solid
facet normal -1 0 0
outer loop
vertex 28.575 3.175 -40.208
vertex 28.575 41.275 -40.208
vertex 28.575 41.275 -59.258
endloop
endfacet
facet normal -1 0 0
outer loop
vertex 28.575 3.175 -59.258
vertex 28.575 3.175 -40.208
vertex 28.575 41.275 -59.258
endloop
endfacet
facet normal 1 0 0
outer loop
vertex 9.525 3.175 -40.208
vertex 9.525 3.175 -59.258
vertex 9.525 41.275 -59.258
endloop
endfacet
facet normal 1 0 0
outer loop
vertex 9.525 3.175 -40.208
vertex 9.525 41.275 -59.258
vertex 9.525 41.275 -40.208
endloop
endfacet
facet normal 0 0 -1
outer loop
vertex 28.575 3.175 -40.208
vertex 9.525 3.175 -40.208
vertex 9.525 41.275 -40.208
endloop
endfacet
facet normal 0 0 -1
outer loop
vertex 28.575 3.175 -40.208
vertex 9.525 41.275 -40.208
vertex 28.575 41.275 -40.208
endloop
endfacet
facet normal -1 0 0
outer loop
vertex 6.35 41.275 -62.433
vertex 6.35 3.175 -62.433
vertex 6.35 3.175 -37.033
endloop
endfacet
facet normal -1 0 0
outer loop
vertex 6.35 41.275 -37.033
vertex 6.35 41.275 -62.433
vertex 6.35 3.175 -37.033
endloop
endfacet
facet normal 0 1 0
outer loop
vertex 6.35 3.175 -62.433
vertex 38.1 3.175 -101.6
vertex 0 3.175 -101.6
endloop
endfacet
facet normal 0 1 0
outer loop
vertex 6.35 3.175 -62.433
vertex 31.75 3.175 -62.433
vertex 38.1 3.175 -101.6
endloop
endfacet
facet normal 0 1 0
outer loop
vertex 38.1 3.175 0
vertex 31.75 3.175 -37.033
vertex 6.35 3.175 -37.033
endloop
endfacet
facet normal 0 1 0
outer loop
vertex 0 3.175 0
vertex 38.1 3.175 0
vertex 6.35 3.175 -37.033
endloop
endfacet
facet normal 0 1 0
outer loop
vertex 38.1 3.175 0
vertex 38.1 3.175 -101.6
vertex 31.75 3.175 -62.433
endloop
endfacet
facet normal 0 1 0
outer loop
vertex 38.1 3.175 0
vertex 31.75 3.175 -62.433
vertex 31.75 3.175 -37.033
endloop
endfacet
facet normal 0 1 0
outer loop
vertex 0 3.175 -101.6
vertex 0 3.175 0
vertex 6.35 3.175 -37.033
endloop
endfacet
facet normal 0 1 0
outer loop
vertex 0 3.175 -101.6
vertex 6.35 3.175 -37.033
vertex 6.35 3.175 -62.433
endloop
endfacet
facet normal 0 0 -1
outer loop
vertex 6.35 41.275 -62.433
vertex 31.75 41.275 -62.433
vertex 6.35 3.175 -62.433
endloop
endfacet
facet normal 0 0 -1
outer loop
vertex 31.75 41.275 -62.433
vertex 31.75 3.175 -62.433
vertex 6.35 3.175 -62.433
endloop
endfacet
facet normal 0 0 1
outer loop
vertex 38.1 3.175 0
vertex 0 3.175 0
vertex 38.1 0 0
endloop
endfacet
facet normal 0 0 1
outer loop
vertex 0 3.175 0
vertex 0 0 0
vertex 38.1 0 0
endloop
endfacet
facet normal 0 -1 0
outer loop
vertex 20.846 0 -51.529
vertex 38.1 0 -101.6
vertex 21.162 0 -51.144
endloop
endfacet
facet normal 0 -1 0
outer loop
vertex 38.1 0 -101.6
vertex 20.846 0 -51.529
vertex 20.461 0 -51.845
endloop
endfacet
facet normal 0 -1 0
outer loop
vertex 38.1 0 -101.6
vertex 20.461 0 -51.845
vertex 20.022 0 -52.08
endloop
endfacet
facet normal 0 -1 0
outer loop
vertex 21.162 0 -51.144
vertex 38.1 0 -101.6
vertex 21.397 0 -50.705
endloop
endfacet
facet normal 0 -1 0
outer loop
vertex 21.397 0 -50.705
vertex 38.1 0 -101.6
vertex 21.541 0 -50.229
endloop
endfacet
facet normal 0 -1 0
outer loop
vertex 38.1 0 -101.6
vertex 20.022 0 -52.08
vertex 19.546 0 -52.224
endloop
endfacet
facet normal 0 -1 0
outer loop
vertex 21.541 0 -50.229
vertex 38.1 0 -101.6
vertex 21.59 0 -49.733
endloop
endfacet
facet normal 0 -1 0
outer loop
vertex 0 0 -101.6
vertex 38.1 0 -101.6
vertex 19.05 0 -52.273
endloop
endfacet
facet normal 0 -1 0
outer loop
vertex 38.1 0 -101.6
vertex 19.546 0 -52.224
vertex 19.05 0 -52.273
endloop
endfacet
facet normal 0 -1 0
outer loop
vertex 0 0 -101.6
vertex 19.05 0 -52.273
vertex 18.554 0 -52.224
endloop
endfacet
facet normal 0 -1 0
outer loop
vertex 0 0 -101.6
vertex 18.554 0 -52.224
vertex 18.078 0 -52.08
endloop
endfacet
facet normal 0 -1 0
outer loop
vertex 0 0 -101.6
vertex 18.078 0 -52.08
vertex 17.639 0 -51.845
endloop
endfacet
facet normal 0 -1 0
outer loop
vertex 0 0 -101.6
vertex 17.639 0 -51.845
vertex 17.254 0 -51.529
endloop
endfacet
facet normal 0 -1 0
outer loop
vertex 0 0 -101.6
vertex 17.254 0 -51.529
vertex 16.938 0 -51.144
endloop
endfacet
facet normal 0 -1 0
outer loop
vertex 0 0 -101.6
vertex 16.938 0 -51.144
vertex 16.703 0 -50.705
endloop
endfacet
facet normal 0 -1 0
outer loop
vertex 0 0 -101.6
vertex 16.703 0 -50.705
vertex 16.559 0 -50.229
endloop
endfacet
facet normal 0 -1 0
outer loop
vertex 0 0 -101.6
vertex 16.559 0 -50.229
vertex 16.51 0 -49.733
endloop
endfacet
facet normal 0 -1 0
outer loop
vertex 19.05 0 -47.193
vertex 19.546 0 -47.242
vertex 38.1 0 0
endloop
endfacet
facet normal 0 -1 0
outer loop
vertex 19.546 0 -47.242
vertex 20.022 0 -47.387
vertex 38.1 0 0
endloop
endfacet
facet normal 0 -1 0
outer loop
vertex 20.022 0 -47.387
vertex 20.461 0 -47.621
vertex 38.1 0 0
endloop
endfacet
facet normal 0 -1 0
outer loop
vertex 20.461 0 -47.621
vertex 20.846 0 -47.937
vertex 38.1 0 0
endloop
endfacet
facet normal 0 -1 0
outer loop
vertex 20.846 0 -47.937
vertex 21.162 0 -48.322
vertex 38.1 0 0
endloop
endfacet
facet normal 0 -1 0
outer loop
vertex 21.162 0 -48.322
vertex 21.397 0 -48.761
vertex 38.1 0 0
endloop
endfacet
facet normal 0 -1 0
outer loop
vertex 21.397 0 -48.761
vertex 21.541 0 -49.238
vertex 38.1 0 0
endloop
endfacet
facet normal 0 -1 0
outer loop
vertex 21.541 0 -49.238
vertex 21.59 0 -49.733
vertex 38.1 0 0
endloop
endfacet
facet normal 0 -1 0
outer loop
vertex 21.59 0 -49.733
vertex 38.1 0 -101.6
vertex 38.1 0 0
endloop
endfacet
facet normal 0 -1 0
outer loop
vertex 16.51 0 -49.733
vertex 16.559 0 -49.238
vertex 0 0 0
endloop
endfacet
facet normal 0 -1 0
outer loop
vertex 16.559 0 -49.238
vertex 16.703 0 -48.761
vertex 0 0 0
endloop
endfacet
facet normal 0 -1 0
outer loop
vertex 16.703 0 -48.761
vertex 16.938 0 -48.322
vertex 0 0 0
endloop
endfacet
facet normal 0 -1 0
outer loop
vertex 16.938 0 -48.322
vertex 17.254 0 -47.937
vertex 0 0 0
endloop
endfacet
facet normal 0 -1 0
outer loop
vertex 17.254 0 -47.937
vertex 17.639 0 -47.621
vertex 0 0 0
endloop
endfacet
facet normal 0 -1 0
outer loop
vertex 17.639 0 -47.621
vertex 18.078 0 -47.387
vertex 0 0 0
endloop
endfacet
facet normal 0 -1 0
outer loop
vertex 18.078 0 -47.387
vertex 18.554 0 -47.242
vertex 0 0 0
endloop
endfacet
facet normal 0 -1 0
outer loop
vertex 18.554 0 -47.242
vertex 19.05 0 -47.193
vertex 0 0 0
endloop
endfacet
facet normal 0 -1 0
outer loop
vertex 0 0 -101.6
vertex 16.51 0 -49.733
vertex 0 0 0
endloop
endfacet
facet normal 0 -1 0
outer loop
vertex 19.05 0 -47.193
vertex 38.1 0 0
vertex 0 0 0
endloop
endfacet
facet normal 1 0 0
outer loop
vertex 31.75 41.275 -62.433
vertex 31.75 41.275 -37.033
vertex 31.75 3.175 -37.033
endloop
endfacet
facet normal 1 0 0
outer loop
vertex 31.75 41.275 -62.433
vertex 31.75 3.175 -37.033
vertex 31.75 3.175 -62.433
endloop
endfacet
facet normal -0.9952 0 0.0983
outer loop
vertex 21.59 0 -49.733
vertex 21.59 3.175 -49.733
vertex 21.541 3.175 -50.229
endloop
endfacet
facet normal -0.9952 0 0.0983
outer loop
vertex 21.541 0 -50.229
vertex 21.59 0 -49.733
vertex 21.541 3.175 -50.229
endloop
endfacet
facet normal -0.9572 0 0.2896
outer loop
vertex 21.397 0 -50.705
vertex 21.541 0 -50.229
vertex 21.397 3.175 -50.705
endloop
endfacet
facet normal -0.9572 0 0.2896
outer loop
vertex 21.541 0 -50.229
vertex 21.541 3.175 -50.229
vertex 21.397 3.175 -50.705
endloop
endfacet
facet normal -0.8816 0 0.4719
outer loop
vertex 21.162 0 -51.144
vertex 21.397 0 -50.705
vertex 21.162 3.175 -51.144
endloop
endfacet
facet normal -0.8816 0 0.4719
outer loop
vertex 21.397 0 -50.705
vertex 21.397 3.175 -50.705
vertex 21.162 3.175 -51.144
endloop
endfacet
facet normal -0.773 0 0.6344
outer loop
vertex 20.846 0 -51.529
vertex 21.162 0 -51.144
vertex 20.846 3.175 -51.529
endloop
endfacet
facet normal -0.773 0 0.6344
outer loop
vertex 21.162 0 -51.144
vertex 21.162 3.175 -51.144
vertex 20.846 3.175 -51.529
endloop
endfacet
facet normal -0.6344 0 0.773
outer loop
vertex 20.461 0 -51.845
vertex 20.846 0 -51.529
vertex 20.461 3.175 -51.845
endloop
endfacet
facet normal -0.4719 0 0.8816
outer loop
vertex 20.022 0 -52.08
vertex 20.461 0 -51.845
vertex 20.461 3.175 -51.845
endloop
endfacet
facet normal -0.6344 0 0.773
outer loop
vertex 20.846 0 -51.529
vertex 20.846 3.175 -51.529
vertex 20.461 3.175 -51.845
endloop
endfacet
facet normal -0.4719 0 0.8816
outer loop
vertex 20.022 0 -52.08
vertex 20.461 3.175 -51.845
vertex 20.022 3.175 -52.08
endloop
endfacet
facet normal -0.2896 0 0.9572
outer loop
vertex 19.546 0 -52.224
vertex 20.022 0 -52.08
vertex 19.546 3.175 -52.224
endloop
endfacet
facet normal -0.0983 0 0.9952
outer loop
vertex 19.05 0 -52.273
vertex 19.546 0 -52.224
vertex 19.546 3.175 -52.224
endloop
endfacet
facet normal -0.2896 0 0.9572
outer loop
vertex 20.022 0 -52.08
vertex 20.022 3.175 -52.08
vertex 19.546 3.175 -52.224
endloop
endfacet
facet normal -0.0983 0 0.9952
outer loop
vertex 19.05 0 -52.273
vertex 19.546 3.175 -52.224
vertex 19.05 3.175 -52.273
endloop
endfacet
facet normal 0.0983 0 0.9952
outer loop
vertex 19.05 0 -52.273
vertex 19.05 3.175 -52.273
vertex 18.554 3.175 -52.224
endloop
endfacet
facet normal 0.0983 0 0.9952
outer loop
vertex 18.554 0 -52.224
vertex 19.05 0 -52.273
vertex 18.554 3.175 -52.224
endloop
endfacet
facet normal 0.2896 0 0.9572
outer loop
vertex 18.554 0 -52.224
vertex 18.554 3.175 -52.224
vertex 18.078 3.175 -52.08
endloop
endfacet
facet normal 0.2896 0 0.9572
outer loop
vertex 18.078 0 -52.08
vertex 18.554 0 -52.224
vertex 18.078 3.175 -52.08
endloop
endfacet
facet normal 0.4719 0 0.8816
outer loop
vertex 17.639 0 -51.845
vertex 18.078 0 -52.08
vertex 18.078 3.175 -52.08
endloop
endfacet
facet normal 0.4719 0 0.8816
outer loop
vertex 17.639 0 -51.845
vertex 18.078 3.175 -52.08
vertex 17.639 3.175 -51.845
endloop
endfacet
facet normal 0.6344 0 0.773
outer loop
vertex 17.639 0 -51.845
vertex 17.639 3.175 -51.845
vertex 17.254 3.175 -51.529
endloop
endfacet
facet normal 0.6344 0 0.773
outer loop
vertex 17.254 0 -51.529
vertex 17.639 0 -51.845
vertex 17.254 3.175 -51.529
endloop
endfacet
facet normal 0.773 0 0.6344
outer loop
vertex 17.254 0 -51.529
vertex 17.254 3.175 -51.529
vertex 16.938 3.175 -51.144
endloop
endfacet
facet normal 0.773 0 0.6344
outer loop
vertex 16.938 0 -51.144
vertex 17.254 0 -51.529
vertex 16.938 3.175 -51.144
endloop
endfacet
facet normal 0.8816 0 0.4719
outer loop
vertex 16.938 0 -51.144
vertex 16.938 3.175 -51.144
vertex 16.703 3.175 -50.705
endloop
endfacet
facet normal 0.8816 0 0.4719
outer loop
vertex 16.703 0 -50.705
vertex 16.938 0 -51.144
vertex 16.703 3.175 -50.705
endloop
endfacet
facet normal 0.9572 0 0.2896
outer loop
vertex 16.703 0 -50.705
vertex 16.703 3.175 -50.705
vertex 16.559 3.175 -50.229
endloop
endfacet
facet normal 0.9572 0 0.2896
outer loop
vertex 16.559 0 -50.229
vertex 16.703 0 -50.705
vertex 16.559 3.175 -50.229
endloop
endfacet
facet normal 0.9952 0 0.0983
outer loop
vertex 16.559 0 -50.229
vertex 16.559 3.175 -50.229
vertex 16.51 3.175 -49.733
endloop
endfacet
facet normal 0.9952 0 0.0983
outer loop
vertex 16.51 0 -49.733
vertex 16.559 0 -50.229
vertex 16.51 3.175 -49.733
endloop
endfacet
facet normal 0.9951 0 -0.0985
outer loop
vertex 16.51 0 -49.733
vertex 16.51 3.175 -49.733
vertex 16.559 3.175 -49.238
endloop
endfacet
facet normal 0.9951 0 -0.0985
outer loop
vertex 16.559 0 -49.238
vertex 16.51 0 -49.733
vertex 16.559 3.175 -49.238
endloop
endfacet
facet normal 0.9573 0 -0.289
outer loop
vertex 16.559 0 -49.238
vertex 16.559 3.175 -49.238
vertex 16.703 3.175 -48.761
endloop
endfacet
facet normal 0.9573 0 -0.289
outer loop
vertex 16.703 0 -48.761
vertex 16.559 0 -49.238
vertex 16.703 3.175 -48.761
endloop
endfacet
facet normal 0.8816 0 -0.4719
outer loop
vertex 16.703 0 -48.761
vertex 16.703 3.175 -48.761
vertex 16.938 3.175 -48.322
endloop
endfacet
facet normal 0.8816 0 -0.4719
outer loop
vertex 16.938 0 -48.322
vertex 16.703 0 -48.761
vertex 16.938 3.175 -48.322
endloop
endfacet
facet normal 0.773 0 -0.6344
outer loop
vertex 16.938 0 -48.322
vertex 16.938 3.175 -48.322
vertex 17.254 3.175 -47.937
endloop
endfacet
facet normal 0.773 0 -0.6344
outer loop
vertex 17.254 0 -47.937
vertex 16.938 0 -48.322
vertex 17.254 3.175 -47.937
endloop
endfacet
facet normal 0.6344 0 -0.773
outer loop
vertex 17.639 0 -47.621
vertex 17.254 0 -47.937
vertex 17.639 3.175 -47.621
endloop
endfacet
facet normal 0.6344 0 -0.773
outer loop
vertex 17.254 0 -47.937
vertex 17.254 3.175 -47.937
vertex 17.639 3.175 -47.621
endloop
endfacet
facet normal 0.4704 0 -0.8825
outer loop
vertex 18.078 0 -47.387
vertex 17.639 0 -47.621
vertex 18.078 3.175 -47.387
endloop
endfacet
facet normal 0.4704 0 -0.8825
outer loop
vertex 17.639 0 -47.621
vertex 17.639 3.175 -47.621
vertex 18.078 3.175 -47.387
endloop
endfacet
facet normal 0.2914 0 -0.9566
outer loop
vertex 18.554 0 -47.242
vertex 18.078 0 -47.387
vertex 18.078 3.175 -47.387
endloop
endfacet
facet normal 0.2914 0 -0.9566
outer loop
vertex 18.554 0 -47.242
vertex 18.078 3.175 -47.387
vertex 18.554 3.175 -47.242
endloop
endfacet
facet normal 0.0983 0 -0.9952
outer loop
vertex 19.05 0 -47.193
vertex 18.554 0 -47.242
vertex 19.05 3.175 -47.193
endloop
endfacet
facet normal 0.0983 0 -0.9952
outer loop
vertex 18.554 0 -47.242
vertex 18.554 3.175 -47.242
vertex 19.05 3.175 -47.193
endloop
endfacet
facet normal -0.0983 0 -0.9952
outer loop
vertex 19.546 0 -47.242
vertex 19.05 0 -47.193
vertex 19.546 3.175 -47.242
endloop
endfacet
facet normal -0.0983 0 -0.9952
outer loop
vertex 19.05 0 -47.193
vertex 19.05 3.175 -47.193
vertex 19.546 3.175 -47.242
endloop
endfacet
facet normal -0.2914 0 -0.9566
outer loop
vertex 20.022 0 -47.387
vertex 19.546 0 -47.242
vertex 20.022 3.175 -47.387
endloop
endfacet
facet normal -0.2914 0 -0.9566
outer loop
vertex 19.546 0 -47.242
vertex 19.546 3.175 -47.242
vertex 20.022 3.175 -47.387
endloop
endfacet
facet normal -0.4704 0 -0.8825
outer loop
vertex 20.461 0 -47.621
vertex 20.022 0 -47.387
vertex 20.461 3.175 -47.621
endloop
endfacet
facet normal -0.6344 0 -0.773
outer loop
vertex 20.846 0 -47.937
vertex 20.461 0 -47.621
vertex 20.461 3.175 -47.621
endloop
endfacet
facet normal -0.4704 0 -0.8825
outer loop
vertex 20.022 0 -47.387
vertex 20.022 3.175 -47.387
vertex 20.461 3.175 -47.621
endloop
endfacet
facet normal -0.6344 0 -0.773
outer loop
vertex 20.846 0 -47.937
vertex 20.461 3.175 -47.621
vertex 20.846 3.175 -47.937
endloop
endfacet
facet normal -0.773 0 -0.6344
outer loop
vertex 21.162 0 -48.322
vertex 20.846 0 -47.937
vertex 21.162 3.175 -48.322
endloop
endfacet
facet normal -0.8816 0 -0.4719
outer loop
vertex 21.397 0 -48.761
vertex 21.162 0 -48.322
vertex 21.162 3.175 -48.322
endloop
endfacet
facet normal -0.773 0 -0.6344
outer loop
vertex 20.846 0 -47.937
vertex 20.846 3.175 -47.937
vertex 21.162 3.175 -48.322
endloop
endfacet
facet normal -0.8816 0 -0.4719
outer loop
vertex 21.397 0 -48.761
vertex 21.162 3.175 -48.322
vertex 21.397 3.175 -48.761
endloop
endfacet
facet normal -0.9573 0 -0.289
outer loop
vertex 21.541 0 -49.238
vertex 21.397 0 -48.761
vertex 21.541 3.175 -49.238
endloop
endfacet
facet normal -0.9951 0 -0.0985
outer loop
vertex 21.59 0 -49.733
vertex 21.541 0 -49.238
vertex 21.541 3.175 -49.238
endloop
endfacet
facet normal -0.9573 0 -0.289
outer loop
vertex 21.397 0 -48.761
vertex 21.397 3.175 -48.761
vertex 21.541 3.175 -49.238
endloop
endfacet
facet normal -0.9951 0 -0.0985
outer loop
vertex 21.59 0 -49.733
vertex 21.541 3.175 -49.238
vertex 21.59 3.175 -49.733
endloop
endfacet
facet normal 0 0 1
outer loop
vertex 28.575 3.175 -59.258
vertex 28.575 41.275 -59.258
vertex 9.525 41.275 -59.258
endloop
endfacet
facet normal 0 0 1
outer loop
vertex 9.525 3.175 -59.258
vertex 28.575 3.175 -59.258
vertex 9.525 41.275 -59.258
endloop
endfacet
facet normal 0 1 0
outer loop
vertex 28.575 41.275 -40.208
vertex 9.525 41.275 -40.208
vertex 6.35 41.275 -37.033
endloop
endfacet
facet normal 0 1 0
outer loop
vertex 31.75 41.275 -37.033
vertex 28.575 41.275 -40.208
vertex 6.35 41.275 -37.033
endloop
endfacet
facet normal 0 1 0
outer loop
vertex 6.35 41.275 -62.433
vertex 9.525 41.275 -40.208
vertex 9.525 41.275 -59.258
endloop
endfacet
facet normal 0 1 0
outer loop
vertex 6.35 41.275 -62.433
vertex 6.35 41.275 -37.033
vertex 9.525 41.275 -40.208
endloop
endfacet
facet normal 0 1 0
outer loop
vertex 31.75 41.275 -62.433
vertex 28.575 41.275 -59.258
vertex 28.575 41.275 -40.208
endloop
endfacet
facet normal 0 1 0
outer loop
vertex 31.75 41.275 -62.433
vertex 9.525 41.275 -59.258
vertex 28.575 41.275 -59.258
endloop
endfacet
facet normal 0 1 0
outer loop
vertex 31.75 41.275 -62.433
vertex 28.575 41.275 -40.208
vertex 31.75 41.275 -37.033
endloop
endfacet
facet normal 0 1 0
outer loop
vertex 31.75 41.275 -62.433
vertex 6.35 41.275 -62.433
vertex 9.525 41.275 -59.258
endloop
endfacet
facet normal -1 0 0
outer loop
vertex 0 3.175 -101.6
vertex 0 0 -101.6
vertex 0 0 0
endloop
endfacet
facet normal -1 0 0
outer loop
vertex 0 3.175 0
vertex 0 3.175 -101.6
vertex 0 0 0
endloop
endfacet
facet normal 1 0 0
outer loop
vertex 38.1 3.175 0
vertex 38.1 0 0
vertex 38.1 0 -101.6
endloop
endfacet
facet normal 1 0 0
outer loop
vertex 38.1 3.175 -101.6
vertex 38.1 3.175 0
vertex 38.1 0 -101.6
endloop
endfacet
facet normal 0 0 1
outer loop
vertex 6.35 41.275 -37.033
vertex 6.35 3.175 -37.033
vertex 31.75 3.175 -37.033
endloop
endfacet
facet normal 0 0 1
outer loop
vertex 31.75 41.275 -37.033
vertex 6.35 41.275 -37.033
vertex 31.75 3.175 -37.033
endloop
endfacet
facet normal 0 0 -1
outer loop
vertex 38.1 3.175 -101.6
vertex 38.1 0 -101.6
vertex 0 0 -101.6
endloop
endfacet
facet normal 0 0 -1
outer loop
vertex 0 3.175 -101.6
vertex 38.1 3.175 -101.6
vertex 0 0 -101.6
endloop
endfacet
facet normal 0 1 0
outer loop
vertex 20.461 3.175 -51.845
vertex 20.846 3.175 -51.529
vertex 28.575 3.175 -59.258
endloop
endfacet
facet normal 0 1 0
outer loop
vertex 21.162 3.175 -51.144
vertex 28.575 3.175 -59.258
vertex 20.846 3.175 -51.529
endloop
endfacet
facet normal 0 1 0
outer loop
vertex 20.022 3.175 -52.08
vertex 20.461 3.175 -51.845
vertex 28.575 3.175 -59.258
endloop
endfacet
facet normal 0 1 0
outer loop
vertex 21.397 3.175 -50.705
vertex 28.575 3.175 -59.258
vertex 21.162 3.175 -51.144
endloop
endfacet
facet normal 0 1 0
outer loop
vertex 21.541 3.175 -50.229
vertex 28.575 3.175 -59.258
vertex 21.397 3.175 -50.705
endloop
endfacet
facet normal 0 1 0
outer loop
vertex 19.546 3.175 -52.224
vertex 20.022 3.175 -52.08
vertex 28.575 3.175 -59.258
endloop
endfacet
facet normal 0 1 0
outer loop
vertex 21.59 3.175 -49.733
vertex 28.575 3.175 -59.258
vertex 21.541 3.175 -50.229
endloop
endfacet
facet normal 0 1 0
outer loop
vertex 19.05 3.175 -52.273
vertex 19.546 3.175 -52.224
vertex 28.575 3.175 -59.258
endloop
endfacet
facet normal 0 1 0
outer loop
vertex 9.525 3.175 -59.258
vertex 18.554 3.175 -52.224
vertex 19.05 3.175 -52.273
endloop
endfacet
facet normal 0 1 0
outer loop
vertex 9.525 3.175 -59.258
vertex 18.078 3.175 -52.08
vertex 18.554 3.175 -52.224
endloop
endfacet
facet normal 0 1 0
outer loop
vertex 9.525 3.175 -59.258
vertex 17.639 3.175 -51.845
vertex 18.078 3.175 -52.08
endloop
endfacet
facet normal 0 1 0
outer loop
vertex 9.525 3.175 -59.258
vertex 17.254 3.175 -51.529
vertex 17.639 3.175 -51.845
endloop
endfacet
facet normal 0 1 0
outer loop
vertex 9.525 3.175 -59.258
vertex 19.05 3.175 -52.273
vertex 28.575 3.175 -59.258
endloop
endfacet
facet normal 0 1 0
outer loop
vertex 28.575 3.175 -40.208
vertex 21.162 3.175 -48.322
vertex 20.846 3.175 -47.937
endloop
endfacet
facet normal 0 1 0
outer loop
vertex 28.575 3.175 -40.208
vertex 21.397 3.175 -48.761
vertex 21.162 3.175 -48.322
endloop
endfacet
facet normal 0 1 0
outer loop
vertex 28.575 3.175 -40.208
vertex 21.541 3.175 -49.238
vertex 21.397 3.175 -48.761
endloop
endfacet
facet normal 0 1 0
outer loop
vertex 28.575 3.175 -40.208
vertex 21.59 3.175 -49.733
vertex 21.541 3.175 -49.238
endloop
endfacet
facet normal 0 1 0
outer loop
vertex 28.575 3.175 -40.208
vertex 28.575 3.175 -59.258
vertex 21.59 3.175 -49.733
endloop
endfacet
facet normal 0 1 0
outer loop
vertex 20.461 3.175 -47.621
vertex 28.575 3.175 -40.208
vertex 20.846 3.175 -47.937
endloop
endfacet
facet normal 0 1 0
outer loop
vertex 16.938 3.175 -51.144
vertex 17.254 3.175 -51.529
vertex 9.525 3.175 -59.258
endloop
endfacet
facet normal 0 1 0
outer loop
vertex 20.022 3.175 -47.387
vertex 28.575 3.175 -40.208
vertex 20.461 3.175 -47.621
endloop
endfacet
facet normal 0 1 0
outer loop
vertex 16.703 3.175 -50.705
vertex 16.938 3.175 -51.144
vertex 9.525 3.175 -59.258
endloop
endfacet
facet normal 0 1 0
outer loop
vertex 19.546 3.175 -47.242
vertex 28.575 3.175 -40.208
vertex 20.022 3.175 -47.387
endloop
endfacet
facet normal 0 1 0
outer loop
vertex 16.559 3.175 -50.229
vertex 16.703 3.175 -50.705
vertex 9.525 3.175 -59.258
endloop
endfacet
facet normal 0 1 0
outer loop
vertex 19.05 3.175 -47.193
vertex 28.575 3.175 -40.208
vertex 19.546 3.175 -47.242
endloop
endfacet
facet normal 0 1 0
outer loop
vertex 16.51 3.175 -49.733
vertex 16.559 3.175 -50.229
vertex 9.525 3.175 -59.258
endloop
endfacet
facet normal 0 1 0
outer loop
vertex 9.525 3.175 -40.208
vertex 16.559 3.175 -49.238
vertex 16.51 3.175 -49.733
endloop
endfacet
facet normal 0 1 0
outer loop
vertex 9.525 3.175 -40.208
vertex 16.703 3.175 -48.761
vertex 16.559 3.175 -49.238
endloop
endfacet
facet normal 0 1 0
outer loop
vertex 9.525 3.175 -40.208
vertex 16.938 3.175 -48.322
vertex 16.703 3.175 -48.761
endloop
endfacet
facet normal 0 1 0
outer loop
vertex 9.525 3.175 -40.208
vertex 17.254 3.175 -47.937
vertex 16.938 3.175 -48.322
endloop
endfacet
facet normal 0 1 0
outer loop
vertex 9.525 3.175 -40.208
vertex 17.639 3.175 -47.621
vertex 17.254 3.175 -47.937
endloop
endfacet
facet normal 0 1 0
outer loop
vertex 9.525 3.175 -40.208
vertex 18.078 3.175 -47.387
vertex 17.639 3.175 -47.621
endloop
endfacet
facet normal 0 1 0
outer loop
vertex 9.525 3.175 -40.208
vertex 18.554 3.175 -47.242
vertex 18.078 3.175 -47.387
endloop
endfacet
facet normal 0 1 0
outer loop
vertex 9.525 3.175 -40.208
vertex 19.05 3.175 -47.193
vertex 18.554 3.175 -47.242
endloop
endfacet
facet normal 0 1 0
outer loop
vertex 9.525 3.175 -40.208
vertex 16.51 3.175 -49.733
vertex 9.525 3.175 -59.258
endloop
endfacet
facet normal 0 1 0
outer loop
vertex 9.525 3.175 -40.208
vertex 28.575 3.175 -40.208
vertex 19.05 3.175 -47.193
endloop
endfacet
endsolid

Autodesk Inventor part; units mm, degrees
ref_plane "YZ Plane" through (0, 0, 0) normal (1, 0, 0) x (0, 1, 0)
ref_plane "XZ Plane" through (0, 0, 0) normal (0, 1, 0) x (-1, 0, 0)
ref_plane "XY Plane" through (0, 0, 0) normal (0, 0, 1) x (1, 0, 0)
sketch "Sketch1" plane through (0, 0, 0) normal (0, 1, 0) x (-1, 0, 0)
  line L0 (0, 0) -> (-38.1, 0)
  line L1 (-38.1, 0) -> (-38.1, -101.6)
  line L2 (-38.1, -101.6) -> (0, -101.6)
  line L3 (0, -101.6) -> (0, 0)
  dimension "d0" = 38.1
  dimension "d1" = 101.6
extrude "Extrusion1" add sketch "Sketch1" along normal blind 3.175
sketch "Sketch3" plane through (0, 3.175, 0) normal (0, 1, 0) x (1, 0, 0)
  line L0 (31.75, 62.4332) -> (6.35, 62.4332)
  line L1 (6.35, 62.4332) -> (6.35, 37.0332)
  line L2 (6.35, 37.0332) -> (31.75, 37.0332)
  line L3 (31.75, 37.0332) -> (31.75, 62.4332)
  line L4 (38.1, 0) -> (38.1, 101.6) projected
  line L5 (38.1, 101.6) -> (0, 101.6) projected
  line L6 (28.575, 59.2582) -> (9.525, 59.2582)
  line L7 (9.525, 59.2582) -> (9.525, 40.2082)
  line L8 (9.525, 40.2082) -> (28.575, 40.2082)
  line L9 (28.575, 40.2082) -> (28.575, 59.2582)
  circle A0 centre (19.05, 49.7332) radius 2.54
  point P0 (0, 0)
  dimension "d8" = 25.4
  dimension "d9" = 25.4
  dimension "d10" = 6.35
  dimension "d11" = 39.1668
  dimension "d12" = 3.175
  dimension "d15" = 5.08
  dimension "d16" = 12.7
  dimension "d17" = 12.7
extrude "Extrusion3" add sketch "Sketch3" along normal blind 38.1 contours L3 L2 L1 L0
extrude "Extrusion5" cut sketch "Sketch3" against normal blind 3.175 contours A0
properties part number "mounting plate" material "ABS Plastic"
